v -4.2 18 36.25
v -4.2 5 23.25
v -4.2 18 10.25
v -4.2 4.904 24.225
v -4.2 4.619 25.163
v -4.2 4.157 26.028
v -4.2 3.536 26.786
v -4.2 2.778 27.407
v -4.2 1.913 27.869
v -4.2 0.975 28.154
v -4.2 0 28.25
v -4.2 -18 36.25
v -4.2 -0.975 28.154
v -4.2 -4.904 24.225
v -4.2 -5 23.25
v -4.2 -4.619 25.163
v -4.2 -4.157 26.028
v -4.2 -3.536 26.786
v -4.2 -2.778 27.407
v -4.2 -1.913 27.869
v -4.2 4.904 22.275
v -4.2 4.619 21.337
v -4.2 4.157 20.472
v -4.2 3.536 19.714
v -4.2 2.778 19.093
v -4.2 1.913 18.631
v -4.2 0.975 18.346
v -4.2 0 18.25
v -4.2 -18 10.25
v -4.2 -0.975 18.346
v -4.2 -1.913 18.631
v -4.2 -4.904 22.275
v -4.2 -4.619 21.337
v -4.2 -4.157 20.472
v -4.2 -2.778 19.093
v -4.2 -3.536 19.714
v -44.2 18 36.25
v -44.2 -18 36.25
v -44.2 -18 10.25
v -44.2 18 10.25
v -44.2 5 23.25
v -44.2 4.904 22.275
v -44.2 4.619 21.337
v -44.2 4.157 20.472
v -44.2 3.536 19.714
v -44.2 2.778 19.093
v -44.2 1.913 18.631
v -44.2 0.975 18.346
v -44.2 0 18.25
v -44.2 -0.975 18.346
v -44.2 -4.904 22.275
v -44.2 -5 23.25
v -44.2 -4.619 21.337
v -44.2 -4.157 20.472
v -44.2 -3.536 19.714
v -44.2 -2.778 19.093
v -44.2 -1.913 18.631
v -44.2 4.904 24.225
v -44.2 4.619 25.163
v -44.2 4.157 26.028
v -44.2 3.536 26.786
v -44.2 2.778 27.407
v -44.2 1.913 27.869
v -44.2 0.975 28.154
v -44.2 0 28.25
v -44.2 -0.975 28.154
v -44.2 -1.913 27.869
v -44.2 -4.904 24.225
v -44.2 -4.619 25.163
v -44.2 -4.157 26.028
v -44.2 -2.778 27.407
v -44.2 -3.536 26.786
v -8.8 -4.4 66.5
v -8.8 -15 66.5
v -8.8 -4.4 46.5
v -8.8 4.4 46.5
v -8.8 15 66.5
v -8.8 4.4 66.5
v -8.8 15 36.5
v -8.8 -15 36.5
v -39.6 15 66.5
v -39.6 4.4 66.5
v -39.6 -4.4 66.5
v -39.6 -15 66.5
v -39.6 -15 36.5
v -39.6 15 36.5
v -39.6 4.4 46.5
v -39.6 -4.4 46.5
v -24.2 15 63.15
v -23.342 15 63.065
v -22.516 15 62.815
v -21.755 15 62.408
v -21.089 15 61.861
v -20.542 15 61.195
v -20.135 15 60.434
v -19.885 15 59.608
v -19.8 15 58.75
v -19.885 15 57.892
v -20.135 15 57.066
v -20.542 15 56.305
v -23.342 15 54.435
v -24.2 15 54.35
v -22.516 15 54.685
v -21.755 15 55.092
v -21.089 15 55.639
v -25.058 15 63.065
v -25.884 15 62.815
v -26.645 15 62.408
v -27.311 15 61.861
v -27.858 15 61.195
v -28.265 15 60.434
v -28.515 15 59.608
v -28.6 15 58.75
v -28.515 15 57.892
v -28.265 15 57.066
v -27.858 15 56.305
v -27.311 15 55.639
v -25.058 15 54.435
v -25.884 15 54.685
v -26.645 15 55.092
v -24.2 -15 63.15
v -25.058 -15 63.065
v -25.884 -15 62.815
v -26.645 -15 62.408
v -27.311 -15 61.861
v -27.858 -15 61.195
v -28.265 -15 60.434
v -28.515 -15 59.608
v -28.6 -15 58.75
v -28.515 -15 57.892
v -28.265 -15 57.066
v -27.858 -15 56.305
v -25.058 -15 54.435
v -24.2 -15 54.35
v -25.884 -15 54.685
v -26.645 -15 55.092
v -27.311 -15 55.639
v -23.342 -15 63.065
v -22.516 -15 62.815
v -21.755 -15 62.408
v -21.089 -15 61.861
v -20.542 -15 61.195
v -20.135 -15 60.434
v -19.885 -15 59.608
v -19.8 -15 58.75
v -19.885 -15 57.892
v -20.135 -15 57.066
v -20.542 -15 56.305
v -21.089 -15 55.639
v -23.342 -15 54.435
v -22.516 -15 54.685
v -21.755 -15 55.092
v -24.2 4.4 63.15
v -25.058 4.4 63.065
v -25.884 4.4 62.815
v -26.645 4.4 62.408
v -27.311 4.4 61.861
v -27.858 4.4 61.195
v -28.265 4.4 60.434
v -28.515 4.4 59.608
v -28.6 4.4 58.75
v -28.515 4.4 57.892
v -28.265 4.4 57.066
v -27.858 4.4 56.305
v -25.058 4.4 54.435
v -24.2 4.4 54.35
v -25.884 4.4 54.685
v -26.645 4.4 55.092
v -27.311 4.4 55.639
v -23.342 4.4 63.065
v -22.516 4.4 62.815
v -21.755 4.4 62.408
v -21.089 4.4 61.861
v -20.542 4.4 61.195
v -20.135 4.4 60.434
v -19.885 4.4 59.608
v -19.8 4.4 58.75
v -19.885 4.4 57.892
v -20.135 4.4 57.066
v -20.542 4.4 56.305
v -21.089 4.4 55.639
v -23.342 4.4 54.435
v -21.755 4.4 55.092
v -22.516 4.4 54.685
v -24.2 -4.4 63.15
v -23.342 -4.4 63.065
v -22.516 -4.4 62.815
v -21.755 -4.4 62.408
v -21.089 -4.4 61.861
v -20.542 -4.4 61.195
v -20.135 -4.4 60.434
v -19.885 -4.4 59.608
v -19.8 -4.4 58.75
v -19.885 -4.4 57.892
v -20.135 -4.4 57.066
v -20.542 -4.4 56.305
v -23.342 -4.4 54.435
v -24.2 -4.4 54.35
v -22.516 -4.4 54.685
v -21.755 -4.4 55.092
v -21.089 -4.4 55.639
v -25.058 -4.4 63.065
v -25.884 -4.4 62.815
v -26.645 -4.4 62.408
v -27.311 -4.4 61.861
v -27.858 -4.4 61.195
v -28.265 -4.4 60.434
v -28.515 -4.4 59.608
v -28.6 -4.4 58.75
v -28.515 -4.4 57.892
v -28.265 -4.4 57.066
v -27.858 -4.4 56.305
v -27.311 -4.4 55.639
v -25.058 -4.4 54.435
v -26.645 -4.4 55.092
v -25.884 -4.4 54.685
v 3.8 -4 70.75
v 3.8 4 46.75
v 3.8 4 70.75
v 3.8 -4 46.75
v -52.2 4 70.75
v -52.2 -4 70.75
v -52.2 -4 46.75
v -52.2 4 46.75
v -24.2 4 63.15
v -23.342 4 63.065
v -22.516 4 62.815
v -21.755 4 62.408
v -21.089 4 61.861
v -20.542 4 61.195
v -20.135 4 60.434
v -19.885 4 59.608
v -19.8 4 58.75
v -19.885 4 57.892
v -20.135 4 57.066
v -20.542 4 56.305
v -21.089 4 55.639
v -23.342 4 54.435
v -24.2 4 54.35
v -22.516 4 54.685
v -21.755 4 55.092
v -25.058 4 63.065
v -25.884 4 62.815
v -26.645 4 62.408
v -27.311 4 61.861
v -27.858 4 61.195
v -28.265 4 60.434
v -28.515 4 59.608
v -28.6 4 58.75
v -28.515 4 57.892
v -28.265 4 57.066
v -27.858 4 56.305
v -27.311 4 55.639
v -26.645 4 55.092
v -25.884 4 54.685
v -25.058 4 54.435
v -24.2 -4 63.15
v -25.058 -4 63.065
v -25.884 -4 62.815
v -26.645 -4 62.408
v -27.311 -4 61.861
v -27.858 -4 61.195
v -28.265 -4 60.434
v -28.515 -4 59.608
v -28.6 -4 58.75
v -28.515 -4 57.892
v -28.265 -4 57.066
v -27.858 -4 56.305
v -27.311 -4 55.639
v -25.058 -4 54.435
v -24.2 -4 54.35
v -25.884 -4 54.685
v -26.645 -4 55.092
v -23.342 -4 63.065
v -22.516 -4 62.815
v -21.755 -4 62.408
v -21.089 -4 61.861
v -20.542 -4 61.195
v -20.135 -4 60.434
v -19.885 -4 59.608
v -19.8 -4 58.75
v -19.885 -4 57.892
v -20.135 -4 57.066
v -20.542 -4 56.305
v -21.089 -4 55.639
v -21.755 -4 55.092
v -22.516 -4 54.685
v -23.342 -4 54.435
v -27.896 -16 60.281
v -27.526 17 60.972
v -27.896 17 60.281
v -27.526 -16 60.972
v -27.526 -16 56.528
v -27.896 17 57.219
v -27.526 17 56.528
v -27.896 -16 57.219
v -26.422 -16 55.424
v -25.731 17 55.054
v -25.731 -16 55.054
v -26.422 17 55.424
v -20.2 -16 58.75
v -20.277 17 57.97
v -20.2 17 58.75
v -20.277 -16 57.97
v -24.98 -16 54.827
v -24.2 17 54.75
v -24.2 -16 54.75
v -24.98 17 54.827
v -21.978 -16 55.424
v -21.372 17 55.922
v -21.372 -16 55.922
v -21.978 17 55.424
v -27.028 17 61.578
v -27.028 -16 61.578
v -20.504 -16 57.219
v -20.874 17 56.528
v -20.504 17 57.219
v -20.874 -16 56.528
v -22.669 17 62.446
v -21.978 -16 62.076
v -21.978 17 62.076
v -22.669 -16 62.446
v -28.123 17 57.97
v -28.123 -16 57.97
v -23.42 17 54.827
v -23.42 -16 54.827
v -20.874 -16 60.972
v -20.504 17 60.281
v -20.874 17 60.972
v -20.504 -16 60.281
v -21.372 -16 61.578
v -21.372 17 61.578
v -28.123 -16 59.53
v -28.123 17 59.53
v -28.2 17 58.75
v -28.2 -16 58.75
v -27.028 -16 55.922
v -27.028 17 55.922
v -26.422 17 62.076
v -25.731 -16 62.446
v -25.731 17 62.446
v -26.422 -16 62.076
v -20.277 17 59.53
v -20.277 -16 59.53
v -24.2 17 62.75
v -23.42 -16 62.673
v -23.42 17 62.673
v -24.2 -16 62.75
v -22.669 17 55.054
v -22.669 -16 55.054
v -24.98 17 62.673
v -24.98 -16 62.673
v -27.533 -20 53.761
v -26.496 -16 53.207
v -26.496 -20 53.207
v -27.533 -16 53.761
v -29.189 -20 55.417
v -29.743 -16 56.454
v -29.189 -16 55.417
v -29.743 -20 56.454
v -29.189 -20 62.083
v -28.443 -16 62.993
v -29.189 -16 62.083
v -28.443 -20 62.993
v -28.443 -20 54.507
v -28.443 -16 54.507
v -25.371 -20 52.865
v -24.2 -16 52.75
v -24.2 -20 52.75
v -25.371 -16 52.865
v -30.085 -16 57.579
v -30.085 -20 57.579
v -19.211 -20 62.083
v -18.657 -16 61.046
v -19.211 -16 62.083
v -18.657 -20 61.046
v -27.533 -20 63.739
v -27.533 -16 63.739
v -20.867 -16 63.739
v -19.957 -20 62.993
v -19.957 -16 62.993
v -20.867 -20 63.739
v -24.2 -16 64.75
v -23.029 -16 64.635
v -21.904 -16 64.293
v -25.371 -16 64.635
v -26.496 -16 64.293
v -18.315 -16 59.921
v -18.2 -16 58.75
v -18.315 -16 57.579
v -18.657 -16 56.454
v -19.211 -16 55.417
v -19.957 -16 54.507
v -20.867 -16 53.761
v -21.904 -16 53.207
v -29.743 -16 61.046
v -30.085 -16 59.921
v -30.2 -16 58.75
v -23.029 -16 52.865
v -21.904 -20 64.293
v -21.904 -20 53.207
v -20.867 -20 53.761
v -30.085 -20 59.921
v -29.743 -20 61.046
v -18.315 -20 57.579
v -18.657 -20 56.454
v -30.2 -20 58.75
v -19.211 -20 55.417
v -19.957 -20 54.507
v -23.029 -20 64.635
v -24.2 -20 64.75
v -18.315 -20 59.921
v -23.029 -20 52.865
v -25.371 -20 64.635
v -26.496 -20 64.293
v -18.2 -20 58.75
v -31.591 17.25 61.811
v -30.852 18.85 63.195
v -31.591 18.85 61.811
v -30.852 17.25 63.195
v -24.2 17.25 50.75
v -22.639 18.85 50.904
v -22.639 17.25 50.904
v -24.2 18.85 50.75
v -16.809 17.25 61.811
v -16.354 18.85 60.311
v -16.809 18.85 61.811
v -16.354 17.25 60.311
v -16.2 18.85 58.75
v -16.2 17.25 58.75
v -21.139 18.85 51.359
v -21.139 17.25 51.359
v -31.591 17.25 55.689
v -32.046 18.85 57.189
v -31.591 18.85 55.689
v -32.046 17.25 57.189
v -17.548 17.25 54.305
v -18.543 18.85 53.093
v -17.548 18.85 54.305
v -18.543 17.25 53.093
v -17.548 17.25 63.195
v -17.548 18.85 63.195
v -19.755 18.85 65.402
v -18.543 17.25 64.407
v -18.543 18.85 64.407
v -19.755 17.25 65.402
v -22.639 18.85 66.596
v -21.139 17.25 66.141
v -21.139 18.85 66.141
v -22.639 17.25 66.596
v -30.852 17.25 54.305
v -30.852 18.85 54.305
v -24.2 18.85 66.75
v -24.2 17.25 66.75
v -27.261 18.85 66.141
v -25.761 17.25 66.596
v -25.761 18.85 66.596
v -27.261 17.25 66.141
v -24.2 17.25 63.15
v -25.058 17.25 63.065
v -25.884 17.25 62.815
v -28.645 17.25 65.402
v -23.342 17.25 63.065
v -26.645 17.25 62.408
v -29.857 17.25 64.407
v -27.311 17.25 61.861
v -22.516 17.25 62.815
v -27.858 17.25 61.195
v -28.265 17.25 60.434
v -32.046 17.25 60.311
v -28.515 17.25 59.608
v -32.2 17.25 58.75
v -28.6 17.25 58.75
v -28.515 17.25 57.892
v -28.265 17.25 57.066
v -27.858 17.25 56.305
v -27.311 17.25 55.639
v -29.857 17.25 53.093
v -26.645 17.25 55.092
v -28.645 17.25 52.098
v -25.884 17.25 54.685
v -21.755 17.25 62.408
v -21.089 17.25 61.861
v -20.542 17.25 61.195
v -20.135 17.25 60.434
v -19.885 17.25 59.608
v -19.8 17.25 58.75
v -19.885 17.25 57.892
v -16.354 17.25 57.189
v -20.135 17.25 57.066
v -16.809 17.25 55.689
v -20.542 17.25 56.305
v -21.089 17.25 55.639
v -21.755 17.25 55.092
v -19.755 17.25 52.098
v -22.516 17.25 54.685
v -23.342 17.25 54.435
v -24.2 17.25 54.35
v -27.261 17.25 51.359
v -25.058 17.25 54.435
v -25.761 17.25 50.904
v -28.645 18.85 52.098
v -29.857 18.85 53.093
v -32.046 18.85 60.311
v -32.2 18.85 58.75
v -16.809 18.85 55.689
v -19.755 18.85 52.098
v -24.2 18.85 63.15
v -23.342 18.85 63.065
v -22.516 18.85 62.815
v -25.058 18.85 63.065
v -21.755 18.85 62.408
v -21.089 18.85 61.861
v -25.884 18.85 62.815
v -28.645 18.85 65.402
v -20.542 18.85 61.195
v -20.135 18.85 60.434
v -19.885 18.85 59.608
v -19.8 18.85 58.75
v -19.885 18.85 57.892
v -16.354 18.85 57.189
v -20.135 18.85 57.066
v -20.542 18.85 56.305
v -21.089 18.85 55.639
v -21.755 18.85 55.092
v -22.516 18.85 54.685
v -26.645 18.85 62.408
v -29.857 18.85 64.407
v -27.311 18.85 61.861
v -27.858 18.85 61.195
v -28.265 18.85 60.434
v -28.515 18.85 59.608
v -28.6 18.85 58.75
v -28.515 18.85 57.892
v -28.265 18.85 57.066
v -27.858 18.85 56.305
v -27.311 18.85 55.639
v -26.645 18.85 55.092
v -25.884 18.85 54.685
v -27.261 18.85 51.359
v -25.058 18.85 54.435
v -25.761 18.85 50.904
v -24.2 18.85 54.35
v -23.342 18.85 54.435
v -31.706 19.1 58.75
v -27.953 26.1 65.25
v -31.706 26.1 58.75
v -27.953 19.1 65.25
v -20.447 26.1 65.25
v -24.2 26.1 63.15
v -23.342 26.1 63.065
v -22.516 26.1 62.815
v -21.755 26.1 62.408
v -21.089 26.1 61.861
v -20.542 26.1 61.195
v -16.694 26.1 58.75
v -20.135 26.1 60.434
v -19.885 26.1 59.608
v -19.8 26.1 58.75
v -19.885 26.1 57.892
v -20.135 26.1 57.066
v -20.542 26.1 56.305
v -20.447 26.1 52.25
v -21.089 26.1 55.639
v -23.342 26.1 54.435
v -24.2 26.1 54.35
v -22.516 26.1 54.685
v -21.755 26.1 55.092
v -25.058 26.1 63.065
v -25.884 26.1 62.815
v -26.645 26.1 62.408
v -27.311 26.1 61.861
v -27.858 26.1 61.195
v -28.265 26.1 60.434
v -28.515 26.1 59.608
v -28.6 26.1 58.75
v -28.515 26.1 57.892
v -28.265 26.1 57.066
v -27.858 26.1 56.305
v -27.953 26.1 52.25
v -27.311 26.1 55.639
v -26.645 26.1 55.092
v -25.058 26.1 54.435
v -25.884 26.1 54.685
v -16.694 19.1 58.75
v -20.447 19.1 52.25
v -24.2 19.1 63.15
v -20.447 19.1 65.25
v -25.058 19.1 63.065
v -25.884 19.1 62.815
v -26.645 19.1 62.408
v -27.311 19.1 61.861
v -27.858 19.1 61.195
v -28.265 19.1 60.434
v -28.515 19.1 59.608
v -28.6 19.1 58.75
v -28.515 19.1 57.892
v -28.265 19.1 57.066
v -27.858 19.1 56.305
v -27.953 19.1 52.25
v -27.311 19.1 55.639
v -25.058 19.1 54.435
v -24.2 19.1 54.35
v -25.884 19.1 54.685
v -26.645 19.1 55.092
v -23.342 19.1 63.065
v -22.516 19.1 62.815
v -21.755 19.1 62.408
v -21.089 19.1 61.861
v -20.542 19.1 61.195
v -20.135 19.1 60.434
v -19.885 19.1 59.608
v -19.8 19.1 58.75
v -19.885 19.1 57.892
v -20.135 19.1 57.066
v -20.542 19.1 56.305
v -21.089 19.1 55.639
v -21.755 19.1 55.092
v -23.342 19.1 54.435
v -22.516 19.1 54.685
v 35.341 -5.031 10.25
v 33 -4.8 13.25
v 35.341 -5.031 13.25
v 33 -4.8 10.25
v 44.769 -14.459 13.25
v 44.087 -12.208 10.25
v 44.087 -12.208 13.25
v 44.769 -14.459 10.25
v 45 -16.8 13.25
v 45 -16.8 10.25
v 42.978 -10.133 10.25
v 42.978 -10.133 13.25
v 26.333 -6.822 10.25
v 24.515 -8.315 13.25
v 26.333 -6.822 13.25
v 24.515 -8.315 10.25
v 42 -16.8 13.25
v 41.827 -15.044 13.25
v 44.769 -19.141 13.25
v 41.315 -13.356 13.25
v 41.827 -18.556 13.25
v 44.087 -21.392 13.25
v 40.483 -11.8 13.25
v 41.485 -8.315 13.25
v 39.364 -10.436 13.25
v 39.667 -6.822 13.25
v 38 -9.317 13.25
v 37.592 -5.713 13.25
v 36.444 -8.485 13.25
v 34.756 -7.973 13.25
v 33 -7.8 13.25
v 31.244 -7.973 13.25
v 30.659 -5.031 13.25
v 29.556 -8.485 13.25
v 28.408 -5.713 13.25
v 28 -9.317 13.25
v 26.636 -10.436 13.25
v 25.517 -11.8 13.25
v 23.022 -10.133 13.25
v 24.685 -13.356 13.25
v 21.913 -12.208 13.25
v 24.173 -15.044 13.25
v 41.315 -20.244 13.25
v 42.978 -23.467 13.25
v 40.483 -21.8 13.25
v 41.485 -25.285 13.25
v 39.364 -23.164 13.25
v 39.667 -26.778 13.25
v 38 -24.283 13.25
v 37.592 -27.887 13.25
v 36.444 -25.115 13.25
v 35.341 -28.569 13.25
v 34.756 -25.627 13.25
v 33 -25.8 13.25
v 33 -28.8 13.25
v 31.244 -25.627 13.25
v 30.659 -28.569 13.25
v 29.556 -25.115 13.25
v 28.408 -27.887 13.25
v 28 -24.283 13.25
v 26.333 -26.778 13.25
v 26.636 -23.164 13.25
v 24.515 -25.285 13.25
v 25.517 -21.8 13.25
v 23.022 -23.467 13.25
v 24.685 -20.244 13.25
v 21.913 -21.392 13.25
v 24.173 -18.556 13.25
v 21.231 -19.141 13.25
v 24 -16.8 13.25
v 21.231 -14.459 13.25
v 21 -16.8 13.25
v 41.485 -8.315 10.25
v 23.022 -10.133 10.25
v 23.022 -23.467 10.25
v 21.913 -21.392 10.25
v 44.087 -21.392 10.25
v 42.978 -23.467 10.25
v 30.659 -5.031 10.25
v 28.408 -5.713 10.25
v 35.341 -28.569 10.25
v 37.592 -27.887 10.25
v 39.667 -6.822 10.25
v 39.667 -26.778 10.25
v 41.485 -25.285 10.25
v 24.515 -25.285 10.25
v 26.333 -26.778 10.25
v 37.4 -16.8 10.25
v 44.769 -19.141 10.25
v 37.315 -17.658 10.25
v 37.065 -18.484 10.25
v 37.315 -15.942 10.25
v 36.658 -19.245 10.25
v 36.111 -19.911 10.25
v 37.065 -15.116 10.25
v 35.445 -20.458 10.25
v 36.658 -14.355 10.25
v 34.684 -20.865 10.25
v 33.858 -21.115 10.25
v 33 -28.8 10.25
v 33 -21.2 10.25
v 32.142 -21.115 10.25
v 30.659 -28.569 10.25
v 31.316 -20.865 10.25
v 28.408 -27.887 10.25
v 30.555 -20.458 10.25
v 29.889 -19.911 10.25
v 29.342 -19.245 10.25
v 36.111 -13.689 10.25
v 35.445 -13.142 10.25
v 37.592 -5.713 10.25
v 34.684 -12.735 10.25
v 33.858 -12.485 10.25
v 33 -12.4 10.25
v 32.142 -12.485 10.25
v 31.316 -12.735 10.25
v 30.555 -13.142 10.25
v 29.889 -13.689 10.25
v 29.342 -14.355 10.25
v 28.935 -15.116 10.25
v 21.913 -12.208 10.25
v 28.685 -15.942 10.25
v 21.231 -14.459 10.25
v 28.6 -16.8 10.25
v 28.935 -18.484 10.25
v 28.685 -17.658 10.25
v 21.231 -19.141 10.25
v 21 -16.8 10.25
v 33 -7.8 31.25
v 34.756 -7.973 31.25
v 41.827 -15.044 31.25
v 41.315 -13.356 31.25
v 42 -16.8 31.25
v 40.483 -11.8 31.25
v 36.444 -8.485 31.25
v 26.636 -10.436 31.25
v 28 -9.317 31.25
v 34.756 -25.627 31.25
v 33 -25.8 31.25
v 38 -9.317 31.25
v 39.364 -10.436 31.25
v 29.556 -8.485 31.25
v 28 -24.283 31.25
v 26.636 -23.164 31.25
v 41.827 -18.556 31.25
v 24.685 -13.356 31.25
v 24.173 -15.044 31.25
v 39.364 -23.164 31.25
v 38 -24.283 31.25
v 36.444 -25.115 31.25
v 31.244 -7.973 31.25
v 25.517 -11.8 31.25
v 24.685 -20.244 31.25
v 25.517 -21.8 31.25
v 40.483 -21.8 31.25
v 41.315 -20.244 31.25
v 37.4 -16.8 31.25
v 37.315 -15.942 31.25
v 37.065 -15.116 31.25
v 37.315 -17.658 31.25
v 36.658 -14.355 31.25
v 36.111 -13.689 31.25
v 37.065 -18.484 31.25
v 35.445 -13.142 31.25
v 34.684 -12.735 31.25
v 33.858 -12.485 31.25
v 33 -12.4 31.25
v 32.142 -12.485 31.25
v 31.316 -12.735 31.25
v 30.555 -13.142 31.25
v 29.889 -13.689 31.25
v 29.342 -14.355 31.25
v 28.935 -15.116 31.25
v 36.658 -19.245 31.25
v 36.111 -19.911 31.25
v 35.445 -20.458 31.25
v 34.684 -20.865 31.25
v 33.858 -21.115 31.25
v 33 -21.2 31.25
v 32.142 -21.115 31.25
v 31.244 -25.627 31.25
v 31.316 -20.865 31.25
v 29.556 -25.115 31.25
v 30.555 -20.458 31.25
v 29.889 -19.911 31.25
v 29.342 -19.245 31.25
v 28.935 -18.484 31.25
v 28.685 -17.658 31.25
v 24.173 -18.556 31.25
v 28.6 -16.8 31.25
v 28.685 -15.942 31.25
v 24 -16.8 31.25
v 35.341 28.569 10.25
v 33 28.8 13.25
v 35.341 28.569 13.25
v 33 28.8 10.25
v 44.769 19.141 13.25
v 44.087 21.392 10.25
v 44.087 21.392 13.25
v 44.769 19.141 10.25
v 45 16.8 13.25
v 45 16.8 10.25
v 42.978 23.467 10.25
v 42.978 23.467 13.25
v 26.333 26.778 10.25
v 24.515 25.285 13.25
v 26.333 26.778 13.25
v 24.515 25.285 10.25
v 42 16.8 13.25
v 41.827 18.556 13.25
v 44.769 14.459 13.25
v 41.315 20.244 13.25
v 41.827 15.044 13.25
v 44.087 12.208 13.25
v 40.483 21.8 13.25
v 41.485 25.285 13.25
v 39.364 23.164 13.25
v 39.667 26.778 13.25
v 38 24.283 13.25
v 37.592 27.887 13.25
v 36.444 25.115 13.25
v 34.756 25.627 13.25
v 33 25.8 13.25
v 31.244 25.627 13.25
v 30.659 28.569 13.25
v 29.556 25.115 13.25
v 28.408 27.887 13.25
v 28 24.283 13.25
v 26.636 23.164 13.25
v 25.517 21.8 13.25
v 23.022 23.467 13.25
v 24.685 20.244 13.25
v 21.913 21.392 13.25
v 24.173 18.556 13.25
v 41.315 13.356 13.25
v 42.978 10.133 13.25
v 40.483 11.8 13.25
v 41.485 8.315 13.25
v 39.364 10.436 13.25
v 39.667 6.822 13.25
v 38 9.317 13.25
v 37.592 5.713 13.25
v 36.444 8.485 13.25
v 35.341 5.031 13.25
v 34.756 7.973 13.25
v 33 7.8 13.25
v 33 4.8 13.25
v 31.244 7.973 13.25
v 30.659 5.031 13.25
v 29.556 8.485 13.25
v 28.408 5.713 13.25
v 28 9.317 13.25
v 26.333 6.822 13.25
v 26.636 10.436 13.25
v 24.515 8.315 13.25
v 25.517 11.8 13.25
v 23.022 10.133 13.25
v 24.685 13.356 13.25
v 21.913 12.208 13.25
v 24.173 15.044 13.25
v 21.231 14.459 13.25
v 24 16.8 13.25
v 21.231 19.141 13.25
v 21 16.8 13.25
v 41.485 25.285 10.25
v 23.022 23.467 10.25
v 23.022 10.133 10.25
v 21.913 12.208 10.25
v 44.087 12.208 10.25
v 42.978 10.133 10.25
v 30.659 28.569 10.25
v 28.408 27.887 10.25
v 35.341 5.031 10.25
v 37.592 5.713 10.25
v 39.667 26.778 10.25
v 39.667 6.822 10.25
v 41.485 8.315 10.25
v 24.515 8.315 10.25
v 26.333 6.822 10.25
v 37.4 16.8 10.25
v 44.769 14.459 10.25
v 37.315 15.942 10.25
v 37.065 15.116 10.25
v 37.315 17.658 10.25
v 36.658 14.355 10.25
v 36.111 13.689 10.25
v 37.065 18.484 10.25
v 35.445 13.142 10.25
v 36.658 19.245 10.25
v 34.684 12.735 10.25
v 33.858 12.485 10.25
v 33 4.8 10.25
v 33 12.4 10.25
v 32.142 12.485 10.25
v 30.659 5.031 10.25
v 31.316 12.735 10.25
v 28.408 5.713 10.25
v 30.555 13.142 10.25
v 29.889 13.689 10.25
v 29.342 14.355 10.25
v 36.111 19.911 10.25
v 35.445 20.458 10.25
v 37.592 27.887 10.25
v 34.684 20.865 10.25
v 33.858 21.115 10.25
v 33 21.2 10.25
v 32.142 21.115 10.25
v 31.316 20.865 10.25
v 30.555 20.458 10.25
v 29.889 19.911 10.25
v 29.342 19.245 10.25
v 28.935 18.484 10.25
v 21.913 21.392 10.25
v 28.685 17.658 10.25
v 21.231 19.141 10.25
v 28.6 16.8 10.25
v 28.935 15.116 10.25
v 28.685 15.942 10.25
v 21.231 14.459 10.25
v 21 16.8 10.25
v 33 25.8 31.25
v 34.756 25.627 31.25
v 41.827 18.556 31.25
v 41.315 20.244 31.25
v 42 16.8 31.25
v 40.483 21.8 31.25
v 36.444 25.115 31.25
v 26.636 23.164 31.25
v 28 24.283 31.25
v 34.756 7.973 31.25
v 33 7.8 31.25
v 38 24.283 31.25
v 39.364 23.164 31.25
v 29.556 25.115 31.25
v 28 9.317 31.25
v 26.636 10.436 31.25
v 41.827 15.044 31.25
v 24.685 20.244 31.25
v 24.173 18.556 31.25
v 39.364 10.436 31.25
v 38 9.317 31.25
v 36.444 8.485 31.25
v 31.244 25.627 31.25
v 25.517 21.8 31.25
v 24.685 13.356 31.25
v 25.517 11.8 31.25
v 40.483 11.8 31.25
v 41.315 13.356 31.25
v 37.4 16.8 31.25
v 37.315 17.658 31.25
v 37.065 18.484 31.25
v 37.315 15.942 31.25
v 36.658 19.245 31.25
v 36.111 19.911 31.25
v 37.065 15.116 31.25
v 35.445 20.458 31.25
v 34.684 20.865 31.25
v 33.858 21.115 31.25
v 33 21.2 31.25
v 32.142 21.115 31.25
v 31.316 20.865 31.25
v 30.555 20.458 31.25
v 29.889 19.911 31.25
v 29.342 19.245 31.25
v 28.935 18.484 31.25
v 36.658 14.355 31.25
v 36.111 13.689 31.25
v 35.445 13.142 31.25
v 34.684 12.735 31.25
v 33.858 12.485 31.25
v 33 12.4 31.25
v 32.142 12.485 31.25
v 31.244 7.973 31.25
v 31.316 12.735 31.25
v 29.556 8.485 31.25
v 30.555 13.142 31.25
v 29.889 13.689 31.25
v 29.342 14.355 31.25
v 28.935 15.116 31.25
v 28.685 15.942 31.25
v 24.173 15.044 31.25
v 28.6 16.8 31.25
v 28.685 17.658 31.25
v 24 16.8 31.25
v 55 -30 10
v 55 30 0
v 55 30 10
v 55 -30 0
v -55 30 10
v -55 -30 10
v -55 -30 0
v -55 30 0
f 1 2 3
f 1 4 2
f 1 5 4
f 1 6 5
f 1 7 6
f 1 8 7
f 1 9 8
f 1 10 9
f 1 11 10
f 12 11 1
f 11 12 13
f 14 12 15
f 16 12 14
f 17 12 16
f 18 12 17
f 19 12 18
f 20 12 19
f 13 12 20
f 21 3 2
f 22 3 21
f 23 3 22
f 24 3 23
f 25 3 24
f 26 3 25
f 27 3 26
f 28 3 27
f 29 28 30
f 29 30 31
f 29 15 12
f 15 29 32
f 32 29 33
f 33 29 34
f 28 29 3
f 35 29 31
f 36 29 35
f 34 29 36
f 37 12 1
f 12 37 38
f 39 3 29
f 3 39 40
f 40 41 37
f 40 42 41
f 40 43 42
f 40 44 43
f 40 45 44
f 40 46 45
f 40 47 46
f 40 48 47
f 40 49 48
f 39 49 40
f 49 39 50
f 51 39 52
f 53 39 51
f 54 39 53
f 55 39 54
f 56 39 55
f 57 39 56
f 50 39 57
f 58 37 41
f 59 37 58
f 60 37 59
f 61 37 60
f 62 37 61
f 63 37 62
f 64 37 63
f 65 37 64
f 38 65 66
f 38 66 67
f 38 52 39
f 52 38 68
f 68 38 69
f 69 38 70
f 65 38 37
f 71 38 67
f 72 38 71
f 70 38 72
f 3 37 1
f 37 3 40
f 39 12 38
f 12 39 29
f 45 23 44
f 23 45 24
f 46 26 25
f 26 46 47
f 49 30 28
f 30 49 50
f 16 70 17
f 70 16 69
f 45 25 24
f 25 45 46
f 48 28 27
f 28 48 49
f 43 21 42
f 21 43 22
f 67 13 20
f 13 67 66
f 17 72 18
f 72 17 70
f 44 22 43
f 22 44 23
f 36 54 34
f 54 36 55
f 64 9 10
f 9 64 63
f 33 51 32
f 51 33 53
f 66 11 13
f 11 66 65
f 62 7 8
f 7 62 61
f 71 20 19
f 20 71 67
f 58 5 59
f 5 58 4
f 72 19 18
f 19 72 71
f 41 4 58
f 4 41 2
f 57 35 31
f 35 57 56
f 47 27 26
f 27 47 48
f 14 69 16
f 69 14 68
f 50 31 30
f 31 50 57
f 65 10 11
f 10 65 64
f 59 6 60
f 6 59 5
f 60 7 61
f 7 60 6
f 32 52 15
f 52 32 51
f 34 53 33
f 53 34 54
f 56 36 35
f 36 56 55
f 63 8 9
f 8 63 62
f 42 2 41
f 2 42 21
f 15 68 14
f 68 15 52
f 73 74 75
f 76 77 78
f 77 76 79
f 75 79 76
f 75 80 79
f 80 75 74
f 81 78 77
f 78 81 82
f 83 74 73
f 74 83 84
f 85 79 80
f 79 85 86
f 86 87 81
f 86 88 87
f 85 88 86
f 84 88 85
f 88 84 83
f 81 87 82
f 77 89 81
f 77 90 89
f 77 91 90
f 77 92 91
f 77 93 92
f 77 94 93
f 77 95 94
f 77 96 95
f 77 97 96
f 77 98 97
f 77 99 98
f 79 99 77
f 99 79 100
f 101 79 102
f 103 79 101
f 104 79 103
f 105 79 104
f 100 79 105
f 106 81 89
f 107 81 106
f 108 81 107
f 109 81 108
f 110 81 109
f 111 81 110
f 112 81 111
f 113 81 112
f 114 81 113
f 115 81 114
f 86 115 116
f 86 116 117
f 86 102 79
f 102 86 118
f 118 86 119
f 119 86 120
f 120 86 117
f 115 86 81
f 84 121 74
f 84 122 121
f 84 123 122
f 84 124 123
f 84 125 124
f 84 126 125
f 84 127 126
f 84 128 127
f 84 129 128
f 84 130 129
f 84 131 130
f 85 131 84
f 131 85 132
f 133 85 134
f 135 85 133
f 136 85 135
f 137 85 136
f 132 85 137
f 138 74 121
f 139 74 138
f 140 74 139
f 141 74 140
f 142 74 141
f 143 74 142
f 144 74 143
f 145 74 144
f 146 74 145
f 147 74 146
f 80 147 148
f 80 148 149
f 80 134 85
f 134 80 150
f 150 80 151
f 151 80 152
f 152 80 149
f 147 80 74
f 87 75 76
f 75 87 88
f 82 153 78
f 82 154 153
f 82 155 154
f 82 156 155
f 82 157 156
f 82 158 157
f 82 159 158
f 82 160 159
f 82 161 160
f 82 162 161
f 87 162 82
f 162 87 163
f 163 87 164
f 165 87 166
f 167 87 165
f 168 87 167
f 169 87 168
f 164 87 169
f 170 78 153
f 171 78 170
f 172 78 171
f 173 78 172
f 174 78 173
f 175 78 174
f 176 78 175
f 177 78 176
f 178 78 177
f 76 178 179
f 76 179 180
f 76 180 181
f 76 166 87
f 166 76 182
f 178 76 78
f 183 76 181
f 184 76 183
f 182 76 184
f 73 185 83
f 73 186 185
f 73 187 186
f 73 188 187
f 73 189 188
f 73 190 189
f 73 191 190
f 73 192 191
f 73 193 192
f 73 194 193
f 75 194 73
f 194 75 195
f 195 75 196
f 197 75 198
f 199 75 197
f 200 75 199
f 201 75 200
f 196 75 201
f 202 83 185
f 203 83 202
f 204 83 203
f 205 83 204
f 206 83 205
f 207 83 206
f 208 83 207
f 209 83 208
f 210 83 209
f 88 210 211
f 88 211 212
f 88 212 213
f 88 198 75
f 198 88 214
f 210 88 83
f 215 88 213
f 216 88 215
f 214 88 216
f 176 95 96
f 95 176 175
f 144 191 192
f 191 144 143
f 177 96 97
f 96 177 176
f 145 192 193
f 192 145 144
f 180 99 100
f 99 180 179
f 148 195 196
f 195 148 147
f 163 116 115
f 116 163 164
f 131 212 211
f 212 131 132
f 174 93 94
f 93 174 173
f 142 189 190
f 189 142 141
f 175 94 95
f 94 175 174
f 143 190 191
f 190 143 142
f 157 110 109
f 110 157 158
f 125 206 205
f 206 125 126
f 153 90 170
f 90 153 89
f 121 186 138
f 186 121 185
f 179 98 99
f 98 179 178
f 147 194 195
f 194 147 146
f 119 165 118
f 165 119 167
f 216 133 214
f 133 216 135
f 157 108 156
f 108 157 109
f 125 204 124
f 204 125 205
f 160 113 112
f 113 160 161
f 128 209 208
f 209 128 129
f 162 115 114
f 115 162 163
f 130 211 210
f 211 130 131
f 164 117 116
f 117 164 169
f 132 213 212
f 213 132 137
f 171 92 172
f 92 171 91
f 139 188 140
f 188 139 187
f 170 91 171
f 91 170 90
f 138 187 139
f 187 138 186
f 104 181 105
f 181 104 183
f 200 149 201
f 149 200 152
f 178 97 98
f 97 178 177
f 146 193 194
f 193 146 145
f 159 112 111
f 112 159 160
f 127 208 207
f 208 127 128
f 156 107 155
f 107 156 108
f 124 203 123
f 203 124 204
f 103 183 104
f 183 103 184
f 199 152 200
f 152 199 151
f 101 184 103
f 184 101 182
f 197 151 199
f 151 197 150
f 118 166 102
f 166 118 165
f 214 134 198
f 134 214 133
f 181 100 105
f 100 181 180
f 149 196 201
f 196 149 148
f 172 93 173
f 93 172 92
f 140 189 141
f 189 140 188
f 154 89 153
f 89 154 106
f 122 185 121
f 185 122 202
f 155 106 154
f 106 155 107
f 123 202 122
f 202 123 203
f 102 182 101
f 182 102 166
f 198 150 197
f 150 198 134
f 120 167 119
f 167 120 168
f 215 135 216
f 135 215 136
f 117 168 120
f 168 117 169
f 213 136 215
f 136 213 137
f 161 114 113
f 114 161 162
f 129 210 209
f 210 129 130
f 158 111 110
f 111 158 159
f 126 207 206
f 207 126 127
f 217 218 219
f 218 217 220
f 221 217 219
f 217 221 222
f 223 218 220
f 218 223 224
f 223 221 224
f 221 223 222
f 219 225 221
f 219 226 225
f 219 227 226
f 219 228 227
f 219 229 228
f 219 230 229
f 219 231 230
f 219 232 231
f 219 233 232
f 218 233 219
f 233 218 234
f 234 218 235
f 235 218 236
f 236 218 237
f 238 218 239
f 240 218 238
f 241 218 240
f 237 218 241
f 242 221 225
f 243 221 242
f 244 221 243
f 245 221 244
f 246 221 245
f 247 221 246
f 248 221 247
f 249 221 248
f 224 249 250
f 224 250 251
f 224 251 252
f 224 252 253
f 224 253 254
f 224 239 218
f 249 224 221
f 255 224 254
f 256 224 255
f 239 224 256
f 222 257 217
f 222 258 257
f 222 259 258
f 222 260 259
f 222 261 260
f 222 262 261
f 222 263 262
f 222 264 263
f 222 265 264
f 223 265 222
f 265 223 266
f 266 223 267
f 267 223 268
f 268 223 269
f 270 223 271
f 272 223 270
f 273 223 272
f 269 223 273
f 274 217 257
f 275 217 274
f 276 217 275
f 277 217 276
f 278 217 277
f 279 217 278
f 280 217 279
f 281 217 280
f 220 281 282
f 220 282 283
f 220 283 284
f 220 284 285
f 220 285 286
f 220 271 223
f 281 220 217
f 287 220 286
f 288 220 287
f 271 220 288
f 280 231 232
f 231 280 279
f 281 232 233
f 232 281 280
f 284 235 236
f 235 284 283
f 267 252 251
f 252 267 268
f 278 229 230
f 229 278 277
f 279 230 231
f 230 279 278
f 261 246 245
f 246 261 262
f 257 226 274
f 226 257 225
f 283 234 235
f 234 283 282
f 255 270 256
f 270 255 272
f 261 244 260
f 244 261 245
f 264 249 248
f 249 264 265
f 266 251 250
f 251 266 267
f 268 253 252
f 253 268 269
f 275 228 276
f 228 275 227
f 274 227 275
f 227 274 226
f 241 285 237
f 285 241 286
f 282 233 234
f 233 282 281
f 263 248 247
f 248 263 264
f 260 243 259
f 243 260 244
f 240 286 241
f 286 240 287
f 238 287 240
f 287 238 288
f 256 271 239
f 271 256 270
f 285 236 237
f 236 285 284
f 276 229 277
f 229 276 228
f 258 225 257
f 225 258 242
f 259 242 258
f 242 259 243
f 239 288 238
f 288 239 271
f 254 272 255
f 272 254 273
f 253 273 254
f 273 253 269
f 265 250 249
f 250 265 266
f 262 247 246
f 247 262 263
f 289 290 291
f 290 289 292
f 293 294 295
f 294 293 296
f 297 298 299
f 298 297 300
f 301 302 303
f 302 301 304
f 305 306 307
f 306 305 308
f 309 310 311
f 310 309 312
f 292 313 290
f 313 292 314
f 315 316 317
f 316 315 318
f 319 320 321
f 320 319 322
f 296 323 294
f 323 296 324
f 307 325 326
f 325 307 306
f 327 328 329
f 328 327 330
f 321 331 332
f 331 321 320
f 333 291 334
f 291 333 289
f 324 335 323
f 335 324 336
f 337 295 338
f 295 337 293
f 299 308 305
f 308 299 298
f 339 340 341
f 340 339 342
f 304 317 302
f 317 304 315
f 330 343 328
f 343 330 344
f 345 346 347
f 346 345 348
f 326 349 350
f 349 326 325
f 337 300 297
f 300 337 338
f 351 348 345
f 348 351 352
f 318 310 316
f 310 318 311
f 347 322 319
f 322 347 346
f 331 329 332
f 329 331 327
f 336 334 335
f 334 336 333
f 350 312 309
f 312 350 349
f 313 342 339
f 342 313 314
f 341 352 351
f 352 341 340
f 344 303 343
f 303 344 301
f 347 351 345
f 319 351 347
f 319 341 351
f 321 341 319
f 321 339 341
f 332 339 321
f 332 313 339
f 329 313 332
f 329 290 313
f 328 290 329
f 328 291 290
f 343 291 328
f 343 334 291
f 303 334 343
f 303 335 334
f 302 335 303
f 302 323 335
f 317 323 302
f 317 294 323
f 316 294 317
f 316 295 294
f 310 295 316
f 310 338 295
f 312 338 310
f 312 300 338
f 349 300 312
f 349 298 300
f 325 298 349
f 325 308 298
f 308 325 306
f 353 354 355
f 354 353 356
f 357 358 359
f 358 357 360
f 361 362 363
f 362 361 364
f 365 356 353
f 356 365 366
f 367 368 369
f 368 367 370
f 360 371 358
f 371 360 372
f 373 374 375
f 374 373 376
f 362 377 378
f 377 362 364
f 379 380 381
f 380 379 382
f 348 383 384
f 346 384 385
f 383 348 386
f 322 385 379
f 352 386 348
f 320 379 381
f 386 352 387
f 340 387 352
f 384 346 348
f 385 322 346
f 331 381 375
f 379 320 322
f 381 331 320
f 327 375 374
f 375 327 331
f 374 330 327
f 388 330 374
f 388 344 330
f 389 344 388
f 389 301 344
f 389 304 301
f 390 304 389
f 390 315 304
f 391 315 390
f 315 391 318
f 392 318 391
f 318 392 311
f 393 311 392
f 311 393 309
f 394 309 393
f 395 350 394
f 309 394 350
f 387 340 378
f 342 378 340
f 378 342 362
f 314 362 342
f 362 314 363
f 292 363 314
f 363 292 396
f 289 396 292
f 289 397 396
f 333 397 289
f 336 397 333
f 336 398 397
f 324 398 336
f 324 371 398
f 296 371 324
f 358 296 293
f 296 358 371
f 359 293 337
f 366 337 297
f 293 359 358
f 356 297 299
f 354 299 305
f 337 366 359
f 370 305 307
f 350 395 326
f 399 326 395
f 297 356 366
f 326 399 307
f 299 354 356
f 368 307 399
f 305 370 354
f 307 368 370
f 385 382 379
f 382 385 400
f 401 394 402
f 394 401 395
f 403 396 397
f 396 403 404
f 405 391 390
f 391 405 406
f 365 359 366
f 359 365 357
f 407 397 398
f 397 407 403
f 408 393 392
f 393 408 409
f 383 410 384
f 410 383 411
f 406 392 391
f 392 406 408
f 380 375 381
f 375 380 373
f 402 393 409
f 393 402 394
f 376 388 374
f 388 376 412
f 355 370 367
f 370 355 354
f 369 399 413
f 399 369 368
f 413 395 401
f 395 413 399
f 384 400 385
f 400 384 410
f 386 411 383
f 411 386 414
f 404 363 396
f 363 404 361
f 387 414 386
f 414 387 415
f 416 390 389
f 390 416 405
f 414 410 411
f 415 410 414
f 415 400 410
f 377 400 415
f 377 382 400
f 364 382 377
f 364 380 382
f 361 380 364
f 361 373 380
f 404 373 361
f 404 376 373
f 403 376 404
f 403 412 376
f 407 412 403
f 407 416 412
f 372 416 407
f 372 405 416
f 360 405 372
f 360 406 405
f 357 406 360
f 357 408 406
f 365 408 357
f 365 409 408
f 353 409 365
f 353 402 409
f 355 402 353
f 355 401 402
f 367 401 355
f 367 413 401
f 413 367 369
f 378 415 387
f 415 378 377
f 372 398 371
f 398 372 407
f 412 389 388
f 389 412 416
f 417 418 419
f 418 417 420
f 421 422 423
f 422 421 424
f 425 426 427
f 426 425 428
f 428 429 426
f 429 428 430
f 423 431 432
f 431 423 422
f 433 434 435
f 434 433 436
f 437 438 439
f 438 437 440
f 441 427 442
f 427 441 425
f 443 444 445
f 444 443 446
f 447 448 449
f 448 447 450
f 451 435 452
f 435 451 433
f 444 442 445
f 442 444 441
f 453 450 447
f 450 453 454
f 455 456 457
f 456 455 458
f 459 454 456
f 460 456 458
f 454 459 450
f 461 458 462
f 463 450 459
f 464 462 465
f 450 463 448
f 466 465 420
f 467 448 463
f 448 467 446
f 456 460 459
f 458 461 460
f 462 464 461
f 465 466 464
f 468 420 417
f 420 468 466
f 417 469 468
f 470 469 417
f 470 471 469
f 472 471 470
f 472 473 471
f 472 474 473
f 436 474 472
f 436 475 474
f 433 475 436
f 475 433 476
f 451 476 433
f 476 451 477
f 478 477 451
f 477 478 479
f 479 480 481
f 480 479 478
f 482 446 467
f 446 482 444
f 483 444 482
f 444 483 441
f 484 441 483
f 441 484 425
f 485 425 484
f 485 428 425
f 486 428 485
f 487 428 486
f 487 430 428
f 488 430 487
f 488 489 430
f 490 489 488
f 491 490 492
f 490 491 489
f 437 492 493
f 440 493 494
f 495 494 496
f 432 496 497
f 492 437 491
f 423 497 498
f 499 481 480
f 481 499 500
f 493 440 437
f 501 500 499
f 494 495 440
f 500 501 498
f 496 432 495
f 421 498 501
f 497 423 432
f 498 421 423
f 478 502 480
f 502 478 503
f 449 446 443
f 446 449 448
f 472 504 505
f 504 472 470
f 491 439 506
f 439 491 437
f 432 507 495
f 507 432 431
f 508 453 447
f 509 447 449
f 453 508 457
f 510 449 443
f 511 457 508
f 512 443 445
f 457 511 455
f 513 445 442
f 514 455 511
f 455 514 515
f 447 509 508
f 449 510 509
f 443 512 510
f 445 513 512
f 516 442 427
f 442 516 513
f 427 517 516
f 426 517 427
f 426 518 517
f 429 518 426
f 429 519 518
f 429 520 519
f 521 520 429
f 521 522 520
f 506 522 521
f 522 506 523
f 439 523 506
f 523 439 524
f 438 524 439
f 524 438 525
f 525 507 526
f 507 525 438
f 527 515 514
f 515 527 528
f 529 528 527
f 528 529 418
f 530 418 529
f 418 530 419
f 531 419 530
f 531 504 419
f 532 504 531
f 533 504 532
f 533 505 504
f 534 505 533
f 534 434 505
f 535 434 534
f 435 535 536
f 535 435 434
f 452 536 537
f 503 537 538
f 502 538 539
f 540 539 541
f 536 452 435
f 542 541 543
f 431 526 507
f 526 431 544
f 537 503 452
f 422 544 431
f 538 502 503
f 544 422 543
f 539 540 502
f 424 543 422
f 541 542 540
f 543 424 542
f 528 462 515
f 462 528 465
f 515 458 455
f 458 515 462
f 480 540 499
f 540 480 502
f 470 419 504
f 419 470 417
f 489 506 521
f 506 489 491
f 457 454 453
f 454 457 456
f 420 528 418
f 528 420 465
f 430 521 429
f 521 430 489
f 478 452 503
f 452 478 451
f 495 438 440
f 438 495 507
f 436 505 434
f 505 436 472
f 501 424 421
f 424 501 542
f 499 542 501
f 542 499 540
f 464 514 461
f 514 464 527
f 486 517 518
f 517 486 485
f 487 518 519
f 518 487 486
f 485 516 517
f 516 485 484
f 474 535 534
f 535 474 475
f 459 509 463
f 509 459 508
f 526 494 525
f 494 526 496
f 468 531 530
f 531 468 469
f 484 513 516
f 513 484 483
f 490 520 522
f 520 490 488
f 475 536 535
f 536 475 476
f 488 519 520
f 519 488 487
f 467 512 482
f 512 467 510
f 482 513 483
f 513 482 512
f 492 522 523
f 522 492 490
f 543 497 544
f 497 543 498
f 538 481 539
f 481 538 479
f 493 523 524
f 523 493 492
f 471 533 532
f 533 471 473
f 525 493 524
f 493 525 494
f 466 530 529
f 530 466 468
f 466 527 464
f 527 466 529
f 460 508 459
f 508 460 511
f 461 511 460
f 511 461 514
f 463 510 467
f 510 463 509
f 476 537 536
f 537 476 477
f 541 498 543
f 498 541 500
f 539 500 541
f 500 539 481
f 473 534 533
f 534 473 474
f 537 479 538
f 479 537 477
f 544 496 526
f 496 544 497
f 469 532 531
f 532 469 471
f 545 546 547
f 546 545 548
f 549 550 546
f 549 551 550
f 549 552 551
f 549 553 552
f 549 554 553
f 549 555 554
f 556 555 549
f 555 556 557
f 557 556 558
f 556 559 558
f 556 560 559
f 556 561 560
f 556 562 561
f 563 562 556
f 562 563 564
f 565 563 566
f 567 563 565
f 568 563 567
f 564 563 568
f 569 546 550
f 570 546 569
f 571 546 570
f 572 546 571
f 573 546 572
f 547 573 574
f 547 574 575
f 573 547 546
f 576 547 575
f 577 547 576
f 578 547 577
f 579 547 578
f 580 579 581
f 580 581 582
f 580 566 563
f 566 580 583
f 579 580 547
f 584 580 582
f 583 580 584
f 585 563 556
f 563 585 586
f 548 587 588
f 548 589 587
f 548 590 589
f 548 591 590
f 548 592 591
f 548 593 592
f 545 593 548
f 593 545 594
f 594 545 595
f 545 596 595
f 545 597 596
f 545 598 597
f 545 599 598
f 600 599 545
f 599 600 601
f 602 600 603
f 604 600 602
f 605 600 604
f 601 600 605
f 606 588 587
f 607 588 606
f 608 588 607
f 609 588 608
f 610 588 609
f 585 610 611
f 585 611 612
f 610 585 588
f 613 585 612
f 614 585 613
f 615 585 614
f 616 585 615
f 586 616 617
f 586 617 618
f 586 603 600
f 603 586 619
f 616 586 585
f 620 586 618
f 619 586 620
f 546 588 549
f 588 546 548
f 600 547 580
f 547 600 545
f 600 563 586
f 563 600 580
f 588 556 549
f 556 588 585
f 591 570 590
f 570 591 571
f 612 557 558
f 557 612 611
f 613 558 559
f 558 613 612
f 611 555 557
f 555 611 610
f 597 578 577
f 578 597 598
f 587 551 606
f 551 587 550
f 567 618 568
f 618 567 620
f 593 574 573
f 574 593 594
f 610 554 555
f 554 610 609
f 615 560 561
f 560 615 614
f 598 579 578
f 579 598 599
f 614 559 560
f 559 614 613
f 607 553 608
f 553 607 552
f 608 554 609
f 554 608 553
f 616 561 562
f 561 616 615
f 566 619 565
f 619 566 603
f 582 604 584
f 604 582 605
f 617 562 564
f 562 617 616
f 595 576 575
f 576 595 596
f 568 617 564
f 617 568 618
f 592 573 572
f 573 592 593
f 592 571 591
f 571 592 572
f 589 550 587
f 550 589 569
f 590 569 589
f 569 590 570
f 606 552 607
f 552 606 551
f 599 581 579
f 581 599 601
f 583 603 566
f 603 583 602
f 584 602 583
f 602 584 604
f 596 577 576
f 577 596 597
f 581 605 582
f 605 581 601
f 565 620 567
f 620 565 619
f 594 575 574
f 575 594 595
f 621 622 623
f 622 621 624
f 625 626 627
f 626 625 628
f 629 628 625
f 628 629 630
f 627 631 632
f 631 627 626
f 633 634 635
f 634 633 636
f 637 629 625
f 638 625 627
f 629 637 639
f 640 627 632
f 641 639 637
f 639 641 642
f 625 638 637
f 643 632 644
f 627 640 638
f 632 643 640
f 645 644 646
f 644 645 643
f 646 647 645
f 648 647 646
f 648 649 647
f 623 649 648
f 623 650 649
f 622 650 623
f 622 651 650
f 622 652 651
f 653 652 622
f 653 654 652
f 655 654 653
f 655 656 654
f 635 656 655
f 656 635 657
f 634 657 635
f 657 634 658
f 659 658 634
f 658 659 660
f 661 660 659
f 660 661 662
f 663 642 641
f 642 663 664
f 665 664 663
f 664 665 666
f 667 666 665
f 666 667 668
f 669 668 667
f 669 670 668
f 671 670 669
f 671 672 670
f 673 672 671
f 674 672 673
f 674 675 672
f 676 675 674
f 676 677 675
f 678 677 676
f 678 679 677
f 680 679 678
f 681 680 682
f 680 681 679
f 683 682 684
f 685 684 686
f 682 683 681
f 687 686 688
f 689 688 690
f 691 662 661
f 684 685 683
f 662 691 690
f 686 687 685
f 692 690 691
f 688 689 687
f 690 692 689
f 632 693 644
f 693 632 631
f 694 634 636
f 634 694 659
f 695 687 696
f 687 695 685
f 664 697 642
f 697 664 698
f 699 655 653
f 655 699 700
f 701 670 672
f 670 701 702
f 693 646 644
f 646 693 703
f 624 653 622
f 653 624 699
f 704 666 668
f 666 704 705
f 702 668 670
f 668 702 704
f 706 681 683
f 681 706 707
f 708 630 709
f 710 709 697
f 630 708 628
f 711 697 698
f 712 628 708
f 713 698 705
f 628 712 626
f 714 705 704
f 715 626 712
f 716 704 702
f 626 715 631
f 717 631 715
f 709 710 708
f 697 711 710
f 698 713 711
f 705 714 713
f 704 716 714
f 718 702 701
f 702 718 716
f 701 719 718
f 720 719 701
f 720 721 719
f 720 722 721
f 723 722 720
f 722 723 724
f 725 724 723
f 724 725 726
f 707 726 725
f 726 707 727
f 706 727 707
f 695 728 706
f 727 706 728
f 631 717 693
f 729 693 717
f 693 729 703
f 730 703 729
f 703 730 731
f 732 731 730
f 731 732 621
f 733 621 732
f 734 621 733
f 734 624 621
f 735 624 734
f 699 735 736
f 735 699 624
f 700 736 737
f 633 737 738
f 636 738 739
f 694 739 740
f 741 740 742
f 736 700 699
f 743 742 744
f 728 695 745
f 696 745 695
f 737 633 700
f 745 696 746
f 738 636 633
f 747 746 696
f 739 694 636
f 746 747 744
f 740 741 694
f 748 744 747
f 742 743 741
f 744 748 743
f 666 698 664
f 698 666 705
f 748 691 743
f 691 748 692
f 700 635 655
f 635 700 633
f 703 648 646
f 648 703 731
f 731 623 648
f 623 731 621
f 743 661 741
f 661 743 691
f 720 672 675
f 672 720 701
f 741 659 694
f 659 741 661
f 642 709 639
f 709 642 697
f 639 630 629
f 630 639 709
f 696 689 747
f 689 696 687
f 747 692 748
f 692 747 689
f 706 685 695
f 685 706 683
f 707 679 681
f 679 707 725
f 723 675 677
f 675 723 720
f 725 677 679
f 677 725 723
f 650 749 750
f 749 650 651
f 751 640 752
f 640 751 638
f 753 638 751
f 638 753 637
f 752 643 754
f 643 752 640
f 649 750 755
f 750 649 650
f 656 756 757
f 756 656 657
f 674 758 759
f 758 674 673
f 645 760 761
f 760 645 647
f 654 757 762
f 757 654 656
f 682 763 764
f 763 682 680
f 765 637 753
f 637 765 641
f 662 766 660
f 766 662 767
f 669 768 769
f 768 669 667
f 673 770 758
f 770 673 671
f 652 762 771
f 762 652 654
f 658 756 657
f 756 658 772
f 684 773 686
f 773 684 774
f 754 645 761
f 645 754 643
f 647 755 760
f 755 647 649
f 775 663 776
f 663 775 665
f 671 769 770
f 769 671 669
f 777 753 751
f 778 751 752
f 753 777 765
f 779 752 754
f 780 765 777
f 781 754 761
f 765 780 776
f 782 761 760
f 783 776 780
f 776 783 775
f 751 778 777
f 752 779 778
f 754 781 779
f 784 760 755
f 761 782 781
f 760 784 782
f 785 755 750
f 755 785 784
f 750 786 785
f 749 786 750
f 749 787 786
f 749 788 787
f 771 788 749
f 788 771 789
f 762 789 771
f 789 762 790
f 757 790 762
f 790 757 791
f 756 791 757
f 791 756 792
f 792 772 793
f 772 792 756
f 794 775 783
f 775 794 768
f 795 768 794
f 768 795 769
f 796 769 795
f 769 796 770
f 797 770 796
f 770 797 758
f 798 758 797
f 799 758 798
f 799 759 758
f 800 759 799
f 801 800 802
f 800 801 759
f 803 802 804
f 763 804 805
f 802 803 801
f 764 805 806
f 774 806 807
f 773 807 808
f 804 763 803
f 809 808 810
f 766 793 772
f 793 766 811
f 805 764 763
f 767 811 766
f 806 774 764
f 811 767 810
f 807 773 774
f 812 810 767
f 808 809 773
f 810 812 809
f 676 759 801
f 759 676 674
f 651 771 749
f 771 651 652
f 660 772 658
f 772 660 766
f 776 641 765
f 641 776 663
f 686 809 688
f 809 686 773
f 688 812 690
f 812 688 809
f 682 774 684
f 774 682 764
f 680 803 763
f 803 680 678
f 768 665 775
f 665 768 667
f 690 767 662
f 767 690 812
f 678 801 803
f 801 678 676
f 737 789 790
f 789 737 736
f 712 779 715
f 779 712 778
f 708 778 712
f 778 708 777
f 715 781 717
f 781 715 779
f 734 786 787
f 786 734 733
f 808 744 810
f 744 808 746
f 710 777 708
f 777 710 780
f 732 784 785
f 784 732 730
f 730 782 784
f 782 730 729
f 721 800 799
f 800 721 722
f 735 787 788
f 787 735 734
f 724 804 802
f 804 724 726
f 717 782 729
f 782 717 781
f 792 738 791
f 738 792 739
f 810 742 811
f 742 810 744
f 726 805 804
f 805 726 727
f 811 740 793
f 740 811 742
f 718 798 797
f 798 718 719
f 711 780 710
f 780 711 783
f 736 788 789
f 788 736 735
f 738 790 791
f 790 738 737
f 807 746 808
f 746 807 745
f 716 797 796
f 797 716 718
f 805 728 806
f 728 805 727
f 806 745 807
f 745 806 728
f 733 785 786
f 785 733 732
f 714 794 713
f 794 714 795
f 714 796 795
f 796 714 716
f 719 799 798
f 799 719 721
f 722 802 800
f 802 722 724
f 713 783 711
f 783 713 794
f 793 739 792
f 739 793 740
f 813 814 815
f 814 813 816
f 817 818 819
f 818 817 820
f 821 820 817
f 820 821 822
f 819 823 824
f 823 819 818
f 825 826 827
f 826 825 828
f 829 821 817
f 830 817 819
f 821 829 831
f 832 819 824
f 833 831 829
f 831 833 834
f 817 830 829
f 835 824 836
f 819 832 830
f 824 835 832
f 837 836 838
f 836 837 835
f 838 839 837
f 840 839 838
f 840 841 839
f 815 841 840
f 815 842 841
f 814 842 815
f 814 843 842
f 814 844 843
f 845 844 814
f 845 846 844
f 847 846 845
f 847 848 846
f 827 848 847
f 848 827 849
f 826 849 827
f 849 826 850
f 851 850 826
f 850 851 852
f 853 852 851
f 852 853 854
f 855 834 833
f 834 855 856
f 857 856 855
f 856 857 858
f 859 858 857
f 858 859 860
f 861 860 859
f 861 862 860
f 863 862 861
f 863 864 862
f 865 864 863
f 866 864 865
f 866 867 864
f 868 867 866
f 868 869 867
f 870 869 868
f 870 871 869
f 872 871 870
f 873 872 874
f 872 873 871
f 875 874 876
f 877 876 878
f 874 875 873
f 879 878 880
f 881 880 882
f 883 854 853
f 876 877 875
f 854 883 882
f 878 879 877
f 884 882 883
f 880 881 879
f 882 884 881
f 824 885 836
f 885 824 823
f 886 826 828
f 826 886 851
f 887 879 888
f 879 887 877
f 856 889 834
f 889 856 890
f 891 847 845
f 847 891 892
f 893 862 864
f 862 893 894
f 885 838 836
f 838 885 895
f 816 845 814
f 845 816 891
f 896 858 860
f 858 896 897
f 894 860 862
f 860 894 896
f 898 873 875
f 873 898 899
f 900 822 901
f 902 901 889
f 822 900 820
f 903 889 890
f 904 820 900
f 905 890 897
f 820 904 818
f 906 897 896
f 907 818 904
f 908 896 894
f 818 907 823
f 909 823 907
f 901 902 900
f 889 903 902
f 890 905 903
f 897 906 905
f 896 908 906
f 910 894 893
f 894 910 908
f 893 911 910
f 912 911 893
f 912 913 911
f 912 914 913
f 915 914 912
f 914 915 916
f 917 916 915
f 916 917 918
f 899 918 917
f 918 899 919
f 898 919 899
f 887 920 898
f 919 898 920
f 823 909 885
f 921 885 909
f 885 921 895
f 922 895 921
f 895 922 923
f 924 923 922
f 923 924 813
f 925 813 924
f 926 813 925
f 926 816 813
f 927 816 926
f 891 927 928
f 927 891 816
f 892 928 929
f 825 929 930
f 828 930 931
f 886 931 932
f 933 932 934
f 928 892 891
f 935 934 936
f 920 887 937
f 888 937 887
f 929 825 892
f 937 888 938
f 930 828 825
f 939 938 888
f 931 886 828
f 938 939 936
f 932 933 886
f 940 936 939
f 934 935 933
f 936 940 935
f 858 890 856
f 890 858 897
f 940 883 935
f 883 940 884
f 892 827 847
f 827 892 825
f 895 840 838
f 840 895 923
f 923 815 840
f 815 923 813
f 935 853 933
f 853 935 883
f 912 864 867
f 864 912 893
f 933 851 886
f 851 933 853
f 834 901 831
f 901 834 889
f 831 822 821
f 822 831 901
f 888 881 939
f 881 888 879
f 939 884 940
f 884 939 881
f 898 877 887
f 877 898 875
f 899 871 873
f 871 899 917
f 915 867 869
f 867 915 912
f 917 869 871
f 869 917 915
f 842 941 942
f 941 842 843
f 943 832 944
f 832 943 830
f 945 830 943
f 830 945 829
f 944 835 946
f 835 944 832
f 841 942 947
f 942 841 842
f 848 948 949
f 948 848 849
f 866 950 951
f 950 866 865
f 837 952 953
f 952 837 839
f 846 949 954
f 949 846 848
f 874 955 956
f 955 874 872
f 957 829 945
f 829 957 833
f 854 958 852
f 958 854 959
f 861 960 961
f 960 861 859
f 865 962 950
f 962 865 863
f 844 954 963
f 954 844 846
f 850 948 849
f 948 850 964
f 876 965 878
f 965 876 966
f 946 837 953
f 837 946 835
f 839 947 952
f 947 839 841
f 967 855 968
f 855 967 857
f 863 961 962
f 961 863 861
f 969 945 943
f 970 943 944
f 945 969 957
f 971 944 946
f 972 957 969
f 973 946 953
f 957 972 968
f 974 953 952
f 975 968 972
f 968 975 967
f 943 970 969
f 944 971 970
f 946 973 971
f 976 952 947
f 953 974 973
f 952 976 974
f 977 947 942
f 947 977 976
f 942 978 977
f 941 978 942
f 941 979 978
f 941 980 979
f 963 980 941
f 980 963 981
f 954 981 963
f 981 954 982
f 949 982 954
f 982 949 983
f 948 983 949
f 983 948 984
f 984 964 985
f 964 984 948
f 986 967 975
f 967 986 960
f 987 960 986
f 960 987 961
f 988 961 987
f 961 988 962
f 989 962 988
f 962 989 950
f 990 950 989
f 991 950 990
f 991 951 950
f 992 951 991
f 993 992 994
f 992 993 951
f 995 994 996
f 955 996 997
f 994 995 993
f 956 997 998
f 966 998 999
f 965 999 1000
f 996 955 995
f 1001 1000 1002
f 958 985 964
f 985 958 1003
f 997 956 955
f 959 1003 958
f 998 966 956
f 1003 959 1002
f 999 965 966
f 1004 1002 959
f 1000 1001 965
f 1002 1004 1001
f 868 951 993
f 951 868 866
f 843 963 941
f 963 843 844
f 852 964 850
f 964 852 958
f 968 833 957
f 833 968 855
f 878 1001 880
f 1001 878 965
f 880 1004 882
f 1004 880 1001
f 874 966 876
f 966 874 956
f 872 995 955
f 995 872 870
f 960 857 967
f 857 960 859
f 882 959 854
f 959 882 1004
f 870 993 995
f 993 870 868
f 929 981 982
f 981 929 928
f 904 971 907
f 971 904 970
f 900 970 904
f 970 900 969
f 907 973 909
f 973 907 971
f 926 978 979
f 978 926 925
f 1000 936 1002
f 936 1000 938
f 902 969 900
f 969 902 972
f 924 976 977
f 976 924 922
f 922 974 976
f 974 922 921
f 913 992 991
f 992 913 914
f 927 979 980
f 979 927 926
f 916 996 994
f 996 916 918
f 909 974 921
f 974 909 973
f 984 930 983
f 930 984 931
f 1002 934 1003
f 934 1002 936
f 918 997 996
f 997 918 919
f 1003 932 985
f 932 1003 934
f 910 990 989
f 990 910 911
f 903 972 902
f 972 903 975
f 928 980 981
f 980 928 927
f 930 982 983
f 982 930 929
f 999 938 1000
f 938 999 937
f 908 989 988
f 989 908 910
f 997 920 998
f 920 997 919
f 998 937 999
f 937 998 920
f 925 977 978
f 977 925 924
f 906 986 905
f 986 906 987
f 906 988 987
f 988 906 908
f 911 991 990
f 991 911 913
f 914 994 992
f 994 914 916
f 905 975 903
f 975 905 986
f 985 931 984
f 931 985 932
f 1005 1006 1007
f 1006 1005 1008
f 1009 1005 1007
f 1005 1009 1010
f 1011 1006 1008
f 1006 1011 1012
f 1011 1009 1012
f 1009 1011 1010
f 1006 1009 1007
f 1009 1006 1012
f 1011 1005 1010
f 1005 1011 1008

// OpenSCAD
$fn = 32;

// ------------------------------------------------------------------------
// Indexing jig: plate 110 x 60 mm, pin d8
// Every part is its own module, assembly() places every instance.
// ------------------------------------------------------------------------

// --- part 1 ---
module jig_plate() {
  difference() {
    translate([-55, -30, 0]) cube([110, 60, 10]);
  }
}

// --- part 2 ---
module locator_block() {
  difference() {
    translate([-20, -18, 0]) cube([40, 36, 26]);
    translate([0, 0, 13]) rotate([0, 90, 0]) cylinder(h = 42, d = 10, center = true);
  }
}

// --- part 3 ---
module index_fork() {
  difference() {
    translate([-15.4, -15, 0]) cube([30.8, 30, 30]);
    translate([-16.4, -4.4, 10]) cube([32.8, 8.8, 21]);
    translate([0, 0, 22.25]) rotate([90, 0, 0]) cylinder(h = 32, d = 8.8, center = true);
  }
}

// --- part 4 ---
module index_arm() {
  difference() {
    translate([-28, -4, 0]) cube([56, 8, 24]);
    translate([0, 0, 12]) rotate([90, 0, 0]) cylinder(h = 10, d = 8.8, center = true);
  }
}

// --- part 5 ---
module index_pin() {
  rotate([0, 90, 0]) cylinder(h = 34, d = 8, center = true);
  translate([-20, 0, 0]) rotate([0, 90, 0]) cylinder(h = 4, d = 12);
}

// --- part 6 ---
module pin_washer() {
  difference() {
      translate([0, 0, 0]) cylinder(h = 1.6, d = 16);
      translate([0, 0, -1]) cylinder(h = 3.6, d = 8.8);
    }
}

// --- part 7 ---
module lock_nut() {
  difference() {
    linear_extrude(height = 7) polygon(points = [[7.506, 0], [3.753, 6.5], [-3.753, 6.5], [-7.506, 0], [-3.753, -6.5], [3.753, -6.5]]);
    translate([0, 0, -1]) cylinder(h = 9, d = 8.8);
  }
}

// --- part 8 ---
module guide_bush_a() {
  difference() {
    union() {
      cylinder(h = 3, d = 24);
      translate([0, 0, 3]) cylinder(h = 18, d = 18);
    }
    translate([0, 0, -1]) cylinder(h = 23, d = 8.8);
  }
}

// --- part 9 ---
module guide_bush_b() {
  difference() {
    union() {
      cylinder(h = 3, d = 24);
      translate([0, 0, 3]) cylinder(h = 18, d = 18);
    }
    translate([0, 0, -1]) cylinder(h = 23, d = 8.8);
  }
}

// --- assembly ---
module assembly() {
  color([0.80, 0.24, 0.20]) translate([0, 0, 0]) rotate([0, 0, 0]) jig_plate();
  color([0.20, 0.45, 0.75]) translate([-24.2, 0, 10.25]) rotate([0, 0, 0]) locator_block();
  color([0.25, 0.62, 0.32]) translate([-24.2, 0, 36.5]) rotate([0, 0, 0]) index_fork();
  color([0.92, 0.70, 0.18]) translate([-24.2, 0, 46.75]) rotate([0, 0, 0]) index_arm();
  color([0.58, 0.35, 0.70]) translate([-24.2, 0, 58.75]) rotate([0, 0, 90]) index_pin();
  color([0.16, 0.66, 0.66]) translate([-24.2, 18.85, 58.75]) rotate([90, 0, 0]) pin_washer();
  color([0.85, 0.48, 0.18]) translate([-24.2, 26.1, 58.75]) rotate([90, 0, 0]) lock_nut();
  color([0.55, 0.60, 0.65]) translate([33, -16.8, 10.25]) rotate([0, 0, 0]) guide_bush_a();
  color([0.75, 0.30, 0.55]) translate([33, 16.8, 10.25]) rotate([0, 0, 0]) guide_bush_b();
}

assembly();
